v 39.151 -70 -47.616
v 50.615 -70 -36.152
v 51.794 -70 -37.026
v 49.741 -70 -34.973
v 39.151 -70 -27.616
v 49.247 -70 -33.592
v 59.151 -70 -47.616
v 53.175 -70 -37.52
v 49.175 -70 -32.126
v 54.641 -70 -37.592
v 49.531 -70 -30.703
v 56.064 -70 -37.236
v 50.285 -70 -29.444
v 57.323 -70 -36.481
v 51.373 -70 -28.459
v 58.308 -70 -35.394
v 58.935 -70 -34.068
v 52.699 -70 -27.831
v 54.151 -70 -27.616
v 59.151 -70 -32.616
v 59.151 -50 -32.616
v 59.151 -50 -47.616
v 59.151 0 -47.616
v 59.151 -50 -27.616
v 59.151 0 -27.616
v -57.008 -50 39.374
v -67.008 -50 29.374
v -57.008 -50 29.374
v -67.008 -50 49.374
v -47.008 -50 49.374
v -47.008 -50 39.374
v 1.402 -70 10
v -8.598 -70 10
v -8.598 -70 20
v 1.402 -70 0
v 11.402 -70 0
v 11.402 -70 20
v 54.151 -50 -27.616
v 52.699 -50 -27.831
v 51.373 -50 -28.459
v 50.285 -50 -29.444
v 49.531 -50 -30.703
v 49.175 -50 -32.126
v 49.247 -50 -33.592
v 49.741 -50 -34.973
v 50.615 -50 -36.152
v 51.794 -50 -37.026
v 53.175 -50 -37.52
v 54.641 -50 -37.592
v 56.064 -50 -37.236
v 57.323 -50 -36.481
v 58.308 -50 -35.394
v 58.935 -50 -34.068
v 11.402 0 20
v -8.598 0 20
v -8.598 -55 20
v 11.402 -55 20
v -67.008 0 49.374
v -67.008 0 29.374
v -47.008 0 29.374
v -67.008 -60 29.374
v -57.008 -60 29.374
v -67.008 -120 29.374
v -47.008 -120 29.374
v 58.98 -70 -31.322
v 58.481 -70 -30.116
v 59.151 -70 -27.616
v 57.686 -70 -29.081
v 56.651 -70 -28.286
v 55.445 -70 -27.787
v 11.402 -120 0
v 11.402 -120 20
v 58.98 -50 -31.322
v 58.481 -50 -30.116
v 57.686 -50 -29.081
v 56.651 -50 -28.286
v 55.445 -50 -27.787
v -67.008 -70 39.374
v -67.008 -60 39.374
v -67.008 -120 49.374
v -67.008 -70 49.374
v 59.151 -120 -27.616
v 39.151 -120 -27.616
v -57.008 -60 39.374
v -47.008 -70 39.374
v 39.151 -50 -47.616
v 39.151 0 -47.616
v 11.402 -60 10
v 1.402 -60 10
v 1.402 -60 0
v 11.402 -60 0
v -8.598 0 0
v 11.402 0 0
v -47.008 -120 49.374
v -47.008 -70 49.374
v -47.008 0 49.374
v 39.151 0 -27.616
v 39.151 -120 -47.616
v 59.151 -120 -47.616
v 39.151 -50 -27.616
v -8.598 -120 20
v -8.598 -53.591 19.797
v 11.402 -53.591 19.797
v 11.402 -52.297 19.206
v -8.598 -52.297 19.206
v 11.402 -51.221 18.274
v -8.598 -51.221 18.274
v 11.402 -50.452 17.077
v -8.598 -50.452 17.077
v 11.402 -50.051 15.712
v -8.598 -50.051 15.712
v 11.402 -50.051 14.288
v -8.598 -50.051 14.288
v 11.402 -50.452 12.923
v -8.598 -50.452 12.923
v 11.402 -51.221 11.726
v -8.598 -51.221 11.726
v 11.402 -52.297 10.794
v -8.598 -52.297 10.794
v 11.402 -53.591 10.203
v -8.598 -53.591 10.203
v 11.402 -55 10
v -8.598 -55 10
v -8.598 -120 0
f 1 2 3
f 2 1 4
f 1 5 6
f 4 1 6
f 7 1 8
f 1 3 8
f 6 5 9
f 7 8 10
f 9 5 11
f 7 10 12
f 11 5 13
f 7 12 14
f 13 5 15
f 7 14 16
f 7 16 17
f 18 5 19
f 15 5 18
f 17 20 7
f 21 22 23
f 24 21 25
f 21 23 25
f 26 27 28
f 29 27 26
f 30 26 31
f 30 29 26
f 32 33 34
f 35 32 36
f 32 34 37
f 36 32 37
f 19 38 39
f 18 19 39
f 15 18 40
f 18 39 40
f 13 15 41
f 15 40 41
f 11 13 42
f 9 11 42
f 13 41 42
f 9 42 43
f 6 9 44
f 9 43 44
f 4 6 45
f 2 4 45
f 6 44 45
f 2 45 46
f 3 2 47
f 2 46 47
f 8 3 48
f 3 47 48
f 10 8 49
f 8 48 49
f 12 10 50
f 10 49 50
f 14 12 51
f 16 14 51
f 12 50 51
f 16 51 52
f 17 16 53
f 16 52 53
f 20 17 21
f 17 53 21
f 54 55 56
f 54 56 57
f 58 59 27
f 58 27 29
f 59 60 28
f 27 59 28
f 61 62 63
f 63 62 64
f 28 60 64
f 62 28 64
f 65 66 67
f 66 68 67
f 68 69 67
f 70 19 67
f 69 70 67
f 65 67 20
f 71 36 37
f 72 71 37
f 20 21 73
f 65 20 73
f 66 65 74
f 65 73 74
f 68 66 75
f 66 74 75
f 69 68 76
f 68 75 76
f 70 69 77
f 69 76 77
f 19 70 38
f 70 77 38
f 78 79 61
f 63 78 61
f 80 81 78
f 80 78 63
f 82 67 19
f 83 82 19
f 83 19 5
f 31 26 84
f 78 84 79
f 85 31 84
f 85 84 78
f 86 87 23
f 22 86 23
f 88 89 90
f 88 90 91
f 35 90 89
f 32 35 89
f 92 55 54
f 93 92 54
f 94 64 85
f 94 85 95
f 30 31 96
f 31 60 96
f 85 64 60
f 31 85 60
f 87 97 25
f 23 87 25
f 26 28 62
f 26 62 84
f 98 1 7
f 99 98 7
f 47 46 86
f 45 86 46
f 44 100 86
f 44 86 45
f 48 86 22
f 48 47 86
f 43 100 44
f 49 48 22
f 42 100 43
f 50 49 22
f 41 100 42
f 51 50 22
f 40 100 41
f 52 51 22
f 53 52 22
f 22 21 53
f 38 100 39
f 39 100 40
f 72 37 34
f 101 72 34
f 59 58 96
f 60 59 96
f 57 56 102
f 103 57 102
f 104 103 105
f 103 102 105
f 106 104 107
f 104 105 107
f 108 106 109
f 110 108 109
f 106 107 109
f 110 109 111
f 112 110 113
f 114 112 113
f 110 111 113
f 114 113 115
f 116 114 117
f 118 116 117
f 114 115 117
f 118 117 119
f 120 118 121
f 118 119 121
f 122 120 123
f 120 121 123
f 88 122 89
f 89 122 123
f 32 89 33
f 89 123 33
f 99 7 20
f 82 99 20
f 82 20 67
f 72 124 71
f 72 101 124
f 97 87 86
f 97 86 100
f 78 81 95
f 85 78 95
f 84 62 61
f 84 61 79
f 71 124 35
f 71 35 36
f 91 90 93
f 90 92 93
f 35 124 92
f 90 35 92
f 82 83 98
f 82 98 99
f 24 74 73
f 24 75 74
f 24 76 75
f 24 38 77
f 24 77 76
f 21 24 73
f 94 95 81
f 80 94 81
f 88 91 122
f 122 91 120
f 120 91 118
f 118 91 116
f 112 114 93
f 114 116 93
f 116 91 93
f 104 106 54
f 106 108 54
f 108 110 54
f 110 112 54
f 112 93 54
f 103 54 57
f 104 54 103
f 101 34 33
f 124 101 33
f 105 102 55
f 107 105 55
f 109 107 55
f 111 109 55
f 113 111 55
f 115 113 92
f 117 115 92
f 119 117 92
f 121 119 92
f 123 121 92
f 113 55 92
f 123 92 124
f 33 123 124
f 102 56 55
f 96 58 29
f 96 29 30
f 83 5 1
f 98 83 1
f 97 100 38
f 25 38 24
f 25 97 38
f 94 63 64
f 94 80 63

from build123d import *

# Parameters (mm, degrees)
F0_W      = 20
F0_H      = 20
F1_DEPTH  = 50
F2_W      = 20
F2_H      = 10
F3_DEPTH  = 10
F4_W      = 10
F4_H      = 10
F5_DEPTH  = 10
F6_W      = 10
F6_H      = 10
F7_DEPTH  = 50
F8_W      = 20
F8_H      = 20
F9_DEPTH  = 60
F10_W     = 10
F10_H     = 10
F11_DEPTH = 10
F13_DEPTH = 20
F14_W     = 10
F14_H     = 10
F15_DEPTH = 50
F16_W     = 20
F16_H     = 20
F17_DEPTH = 50
F19_DEPTH = 20
F21_DEPTH = 50
F22_DEPTH = 10
F23_W     = 10
F23_H     = 10
F24_DEPTH = 10


with BuildPart() as f1:
    # F0 (on Front) → F1 (new body)
    with BuildSketch(Plane.XZ):
        with Locations((-57.0076722652, 39.3739437685)):
            Rectangle(F0_W, F0_H)
    extrude(amount=F1_DEPTH)

    # F2 (on face) → F3 (join)
    with BuildSketch(Plane.XZ.offset(50)):
        with Locations((-57.0076722652, 34.3739437685)):
            Rectangle(F2_W, F2_H)
    extrude(amount=F3_DEPTH)

    # F4 (on face) → F5 (join)
    with BuildSketch(Plane.XZ.offset(60)):
        with Locations((-52.0076722652, 34.3739437685)):
            Rectangle(F4_W, F4_H)
    extrude(amount=F5_DEPTH)

    # F6 (on face) → F7 (join)
    with BuildSketch(Plane.XZ.offset(70)):
        Polygon((-67.0076722652, 29.3739437685), (-57.0076722652, 29.3739437685), (-57.0076722652, 39.3739437685), (-47.0076722652, 39.3739437685), (-47.0076722652, 49.3739437685), (-67.0076722652, 49.3739437685), align=None)
        with Locations((-52.0076722652, 34.3739437685)):
            Rectangle(F6_W, F6_H)
    extrude(amount=F7_DEPTH)

    # F22 (cut): a face of the model
    f22_faces = [f1.faces().sort_by_distance(p)[0] for p in [
        (-62.0076722652, -60, 34.3739437685),
    ]]
    extrude(f22_faces, amount=-F22_DEPTH, mode=Mode.SUBTRACT)

    # F23 (on face) → F24 (join)
    with BuildSketch(Plane(origin=(-57.0076722652, 0, 0), x_dir=(0, -1, 0), z_dir=(-1, 0, 0))):
        with Locations((65, 34.3739437685)):
            Rectangle(F23_W, F23_H)
    extrude(amount=F24_DEPTH)


with BuildPart() as f9:
    # F8 (on Front) → F9 (new body)
    with BuildSketch(Plane.XZ):
        with Locations((1.4022570103, 10)):
            Rectangle(F8_W, F8_H)
    extrude(amount=F9_DEPTH)

    # F10 (on face) → F11 (join)
    with BuildSketch(Plane.XZ.offset(60)):
        with Locations((-3.5977429897, 5)):
            Rectangle(F10_W, F10_H)
    extrude(amount=F11_DEPTH)

    # F12 (on face) → F13 (cut)
    with BuildSketch(Plane(origin=(-8.5977429897, 0, 0), x_dir=(0, -1, 0), z_dir=(-1, 0, 0))):
        with BuildLine():
            Line((60, 20), (55, 20))
            ThreePointArc((55, 20), (50, 15), (55, 10))
            Line((55, 10), (60, 10))
            Line((60, 10), (60, 20))
        make_face()
    extrude(amount=-F13_DEPTH, mode=Mode.SUBTRACT)

    # F14 (on face) → F15 (join)
    with BuildSketch(Plane.XZ.offset(70)):
        with Locations((-3.5977429897, 5)):
            Rectangle(F14_W, F14_H)
        Polygon((1.4022570103, 10), (1.4022570103, 0), (11.4022570103, 0), (11.4022570103, 20), (-8.5977429897, 20), (-8.5977429897, 10), align=None)
    extrude(amount=F15_DEPTH)


with BuildPart() as f17:
    # F16 (on Front) → F17 (new body)
    with BuildSketch(Plane.XZ):
        with Locations((49.1505376995, -37.6162012305)):
            Rectangle(F16_W, F16_H)
    extrude(amount=F17_DEPTH)

    # F18 (on face) → F19 (join)
    with BuildSketch(Plane.XZ.offset(50)):
        with BuildLine():
            ThreePointArc((54.1505376995, -27.6162012305), (50.6150037935, -36.1517351364), (59.1505376995, -32.6162012305))
            ThreePointArc((59.1505376995, -32.6162012305), (57.6860716054, -29.0806673245), (54.1505376995, -27.6162012305))
        make_face()
    extrude(amount=F19_DEPTH)

    # F20 (on face) → F21 (join)
    with BuildSketch(Plane.XZ.offset(70)):
        with BuildLine():
            Line((54.1505376995, -27.6162012305), (39.1505376995, -27.6162012305))
            Line((39.1505376995, -27.6162012305), (39.1505376995, -47.6162012305))
            Line((39.1505376995, -47.6162012305), (59.1505376995, -47.6162012305))
            Line((59.1505376995, -47.6162012305), (59.1505376995, -32.6162012305))
            ThreePointArc((59.1505376995, -32.6162012305), (50.6150037935, -36.1517351364), (54.1505376995, -27.6162012305))
        make_face()
        with BuildLine():
            ThreePointArc((59.1505376995, -32.6162012305), (57.6860716054, -29.0806673245), (54.1505376995, -27.6162012305))
            ThreePointArc((54.1505376995, -27.6162012305), (50.6150037935, -36.1517351364), (59.1505376995, -32.6162012305))
        make_face()
        with BuildLine():
            Line((59.1505376995, -27.6162012305), (54.1505376995, -27.6162012305))
            ThreePointArc((54.1505376995, -27.6162012305), (57.6860716054, -29.0806673245), (59.1505376995, -32.6162012305))
            Line((59.1505376995, -32.6162012305), (59.1505376995, -27.6162012305))
        make_face()
    extrude(amount=F21_DEPTH)


solid = Compound([f1.part, f9.part, f17.part])
